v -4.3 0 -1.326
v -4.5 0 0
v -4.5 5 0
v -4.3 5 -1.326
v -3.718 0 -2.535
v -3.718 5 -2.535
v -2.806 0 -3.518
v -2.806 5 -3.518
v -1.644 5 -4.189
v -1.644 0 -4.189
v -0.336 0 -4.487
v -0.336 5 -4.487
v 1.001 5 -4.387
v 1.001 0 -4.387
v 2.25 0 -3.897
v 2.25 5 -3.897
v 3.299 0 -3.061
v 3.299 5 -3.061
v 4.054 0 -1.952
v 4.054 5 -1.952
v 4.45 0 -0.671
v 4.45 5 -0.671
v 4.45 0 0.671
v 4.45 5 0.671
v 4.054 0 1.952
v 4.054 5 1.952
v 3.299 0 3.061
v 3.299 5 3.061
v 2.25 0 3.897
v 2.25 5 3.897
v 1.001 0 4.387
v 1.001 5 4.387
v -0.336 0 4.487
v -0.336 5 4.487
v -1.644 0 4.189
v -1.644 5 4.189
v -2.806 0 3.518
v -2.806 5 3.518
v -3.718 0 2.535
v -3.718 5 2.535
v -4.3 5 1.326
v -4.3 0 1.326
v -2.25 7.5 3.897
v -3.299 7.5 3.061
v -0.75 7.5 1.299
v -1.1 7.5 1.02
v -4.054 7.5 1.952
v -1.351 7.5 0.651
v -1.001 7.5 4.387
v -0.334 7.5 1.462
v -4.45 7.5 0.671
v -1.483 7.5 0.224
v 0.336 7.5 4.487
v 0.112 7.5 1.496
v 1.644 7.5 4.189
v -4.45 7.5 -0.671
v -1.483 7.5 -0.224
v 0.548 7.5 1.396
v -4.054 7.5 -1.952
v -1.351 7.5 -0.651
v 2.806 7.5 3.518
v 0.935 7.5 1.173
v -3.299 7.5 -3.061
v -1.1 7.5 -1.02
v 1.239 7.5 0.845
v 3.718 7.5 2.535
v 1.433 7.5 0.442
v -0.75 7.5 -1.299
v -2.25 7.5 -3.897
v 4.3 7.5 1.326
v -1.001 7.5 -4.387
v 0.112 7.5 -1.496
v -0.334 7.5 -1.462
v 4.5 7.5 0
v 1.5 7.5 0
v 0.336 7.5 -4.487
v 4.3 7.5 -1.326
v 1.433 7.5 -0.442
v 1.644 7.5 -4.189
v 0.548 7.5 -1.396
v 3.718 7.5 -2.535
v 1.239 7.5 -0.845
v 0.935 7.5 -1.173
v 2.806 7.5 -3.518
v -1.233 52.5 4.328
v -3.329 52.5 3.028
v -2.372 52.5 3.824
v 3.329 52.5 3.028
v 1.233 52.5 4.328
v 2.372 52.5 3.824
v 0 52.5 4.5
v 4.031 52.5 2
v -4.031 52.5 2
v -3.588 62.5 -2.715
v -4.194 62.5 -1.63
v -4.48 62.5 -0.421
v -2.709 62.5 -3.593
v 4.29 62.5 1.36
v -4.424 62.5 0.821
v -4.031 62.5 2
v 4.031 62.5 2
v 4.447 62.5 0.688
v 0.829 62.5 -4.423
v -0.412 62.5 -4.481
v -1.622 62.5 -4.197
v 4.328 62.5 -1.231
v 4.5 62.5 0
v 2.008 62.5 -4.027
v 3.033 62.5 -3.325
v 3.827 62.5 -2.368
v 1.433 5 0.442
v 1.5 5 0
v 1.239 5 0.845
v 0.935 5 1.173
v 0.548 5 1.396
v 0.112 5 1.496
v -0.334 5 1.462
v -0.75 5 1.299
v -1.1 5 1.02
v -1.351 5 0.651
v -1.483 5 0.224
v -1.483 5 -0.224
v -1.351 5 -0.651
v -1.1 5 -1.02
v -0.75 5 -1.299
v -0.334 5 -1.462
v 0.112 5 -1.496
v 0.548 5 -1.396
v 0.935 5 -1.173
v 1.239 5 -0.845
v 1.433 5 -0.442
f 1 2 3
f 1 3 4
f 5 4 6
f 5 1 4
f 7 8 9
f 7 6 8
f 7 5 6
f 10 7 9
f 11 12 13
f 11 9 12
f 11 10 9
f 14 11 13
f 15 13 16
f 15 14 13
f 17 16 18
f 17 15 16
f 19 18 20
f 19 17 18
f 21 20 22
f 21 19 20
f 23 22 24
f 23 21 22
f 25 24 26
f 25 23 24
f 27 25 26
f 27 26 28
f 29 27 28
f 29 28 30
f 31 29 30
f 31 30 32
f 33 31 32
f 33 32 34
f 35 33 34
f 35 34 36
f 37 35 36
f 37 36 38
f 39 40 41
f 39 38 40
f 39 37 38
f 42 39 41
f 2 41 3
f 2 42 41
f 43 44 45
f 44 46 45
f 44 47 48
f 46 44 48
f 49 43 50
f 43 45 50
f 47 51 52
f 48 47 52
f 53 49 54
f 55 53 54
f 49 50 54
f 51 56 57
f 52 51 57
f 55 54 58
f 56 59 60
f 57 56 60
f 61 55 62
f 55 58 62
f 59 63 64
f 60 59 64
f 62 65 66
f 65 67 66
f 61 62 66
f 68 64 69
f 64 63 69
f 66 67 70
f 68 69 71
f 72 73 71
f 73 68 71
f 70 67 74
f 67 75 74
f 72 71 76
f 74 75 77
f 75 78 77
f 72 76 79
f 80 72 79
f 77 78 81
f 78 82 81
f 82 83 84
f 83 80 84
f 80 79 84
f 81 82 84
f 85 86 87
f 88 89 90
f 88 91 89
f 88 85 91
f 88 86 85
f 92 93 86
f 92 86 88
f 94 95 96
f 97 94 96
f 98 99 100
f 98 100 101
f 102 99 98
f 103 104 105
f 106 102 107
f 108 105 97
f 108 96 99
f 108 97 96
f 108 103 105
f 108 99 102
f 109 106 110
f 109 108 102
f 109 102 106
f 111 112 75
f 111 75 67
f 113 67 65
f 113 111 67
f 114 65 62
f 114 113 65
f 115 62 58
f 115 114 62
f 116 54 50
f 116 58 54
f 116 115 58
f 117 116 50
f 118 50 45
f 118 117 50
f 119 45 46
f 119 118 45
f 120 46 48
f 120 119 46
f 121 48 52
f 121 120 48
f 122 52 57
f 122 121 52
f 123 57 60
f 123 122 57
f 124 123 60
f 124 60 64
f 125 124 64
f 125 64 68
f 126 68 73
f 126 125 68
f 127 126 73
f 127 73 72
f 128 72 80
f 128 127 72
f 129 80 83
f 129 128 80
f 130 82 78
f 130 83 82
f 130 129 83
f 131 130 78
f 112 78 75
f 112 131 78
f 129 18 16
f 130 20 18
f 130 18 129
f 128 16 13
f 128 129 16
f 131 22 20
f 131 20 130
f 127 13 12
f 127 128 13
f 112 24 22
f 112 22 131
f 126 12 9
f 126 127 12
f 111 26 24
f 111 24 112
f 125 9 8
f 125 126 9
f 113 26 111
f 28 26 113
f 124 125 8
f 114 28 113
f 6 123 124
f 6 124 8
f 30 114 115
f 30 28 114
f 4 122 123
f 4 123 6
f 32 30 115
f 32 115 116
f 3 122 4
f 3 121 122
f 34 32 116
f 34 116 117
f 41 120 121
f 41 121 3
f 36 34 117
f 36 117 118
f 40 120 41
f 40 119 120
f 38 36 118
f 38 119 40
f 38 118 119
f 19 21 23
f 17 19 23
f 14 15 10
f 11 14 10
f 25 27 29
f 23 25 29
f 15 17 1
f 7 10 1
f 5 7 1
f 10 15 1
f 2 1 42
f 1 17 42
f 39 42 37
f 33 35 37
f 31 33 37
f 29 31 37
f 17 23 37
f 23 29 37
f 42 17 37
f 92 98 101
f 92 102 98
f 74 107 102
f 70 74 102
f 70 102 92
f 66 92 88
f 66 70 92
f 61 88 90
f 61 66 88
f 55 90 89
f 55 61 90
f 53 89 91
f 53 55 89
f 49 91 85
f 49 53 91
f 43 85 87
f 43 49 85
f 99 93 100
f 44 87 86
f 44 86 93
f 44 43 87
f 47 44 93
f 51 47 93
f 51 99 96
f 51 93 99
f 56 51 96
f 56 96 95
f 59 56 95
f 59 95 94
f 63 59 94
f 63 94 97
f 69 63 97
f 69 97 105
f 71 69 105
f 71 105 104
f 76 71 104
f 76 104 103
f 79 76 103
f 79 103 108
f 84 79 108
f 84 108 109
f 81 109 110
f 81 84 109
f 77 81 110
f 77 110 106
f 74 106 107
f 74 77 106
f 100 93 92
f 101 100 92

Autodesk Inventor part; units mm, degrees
ref_plane "YZ Plane" through (0, 0, 0) normal (1, 0, 0) x (0, 1, 0)
ref_plane "XZ Plane" through (0, 0, 0) normal (0, 1, 0) x (-1, 0, 0)
ref_plane "XY Plane" through (0, 0, 0) normal (0, 0, 1) x (1, 0, 0)
sketch "Эскиз1" plane through (0, 0, 0) normal (0, 1, 0) x (-1, 0, 0)
  circle A0 centre (0, 0) radius 4.5
  dimension "d0" = 9
sketch "Эскиз5" plane through (0, 0, 0) normal (0, 1, 0) x (-1, 0, 0)
  point P0 (0, 0)
extrude "Выдавливание4" add sketch "Эскиз1" along normal blind 5
sketch "Эскиз6" plane through (0, 5, 0) normal (0, 1, 0) x (1, 0, 0)
  circle A0 centre (0, 0) radius 4.5 projected
  circle A1 centre (0, 0) radius 1.5
  dimension "d12" = 3
extrude "Выдавливание5" add sketch "Эскиз6" along normal blind 2.5 contours A1
sketch "Эскиз7" plane through (0, 7.5, 0) normal (0, 1, 0) x (1, 0, 0)
  circle A0 centre (0, 0) radius 4.5
  dimension "d15" = 9
extrude "Выдавливание6" add sketch "Эскиз7" along normal blind 55
sketch "Эскиз8" plane through (0, 62.5, 0) normal (0, 1, 0) x (1, 0, 0)
  line L0 (0, 0) -> (0, -2)
  line L1 (0, -2) -> (-5.0098, -2)
  line L2 (0, -2) -> (5.0098, -2)
  line L3 (5.0098, -2) -> (5.0098, -6.5905)
  line L4 (5.0098, -6.5905) -> (-5.0098, -6.5905)
  line L5 (-5.0098, -6.5905) -> (-5.0098, -2)
  dimension "d18" = 2
sketch "Эскиз9" plane through (0, 62.5, 0) normal (0, 1, 0) x (1, 0, 0)
  point P0 (0, 0)
extrude "Выдавливание7" cut sketch "Эскиз8" against normal blind 10
